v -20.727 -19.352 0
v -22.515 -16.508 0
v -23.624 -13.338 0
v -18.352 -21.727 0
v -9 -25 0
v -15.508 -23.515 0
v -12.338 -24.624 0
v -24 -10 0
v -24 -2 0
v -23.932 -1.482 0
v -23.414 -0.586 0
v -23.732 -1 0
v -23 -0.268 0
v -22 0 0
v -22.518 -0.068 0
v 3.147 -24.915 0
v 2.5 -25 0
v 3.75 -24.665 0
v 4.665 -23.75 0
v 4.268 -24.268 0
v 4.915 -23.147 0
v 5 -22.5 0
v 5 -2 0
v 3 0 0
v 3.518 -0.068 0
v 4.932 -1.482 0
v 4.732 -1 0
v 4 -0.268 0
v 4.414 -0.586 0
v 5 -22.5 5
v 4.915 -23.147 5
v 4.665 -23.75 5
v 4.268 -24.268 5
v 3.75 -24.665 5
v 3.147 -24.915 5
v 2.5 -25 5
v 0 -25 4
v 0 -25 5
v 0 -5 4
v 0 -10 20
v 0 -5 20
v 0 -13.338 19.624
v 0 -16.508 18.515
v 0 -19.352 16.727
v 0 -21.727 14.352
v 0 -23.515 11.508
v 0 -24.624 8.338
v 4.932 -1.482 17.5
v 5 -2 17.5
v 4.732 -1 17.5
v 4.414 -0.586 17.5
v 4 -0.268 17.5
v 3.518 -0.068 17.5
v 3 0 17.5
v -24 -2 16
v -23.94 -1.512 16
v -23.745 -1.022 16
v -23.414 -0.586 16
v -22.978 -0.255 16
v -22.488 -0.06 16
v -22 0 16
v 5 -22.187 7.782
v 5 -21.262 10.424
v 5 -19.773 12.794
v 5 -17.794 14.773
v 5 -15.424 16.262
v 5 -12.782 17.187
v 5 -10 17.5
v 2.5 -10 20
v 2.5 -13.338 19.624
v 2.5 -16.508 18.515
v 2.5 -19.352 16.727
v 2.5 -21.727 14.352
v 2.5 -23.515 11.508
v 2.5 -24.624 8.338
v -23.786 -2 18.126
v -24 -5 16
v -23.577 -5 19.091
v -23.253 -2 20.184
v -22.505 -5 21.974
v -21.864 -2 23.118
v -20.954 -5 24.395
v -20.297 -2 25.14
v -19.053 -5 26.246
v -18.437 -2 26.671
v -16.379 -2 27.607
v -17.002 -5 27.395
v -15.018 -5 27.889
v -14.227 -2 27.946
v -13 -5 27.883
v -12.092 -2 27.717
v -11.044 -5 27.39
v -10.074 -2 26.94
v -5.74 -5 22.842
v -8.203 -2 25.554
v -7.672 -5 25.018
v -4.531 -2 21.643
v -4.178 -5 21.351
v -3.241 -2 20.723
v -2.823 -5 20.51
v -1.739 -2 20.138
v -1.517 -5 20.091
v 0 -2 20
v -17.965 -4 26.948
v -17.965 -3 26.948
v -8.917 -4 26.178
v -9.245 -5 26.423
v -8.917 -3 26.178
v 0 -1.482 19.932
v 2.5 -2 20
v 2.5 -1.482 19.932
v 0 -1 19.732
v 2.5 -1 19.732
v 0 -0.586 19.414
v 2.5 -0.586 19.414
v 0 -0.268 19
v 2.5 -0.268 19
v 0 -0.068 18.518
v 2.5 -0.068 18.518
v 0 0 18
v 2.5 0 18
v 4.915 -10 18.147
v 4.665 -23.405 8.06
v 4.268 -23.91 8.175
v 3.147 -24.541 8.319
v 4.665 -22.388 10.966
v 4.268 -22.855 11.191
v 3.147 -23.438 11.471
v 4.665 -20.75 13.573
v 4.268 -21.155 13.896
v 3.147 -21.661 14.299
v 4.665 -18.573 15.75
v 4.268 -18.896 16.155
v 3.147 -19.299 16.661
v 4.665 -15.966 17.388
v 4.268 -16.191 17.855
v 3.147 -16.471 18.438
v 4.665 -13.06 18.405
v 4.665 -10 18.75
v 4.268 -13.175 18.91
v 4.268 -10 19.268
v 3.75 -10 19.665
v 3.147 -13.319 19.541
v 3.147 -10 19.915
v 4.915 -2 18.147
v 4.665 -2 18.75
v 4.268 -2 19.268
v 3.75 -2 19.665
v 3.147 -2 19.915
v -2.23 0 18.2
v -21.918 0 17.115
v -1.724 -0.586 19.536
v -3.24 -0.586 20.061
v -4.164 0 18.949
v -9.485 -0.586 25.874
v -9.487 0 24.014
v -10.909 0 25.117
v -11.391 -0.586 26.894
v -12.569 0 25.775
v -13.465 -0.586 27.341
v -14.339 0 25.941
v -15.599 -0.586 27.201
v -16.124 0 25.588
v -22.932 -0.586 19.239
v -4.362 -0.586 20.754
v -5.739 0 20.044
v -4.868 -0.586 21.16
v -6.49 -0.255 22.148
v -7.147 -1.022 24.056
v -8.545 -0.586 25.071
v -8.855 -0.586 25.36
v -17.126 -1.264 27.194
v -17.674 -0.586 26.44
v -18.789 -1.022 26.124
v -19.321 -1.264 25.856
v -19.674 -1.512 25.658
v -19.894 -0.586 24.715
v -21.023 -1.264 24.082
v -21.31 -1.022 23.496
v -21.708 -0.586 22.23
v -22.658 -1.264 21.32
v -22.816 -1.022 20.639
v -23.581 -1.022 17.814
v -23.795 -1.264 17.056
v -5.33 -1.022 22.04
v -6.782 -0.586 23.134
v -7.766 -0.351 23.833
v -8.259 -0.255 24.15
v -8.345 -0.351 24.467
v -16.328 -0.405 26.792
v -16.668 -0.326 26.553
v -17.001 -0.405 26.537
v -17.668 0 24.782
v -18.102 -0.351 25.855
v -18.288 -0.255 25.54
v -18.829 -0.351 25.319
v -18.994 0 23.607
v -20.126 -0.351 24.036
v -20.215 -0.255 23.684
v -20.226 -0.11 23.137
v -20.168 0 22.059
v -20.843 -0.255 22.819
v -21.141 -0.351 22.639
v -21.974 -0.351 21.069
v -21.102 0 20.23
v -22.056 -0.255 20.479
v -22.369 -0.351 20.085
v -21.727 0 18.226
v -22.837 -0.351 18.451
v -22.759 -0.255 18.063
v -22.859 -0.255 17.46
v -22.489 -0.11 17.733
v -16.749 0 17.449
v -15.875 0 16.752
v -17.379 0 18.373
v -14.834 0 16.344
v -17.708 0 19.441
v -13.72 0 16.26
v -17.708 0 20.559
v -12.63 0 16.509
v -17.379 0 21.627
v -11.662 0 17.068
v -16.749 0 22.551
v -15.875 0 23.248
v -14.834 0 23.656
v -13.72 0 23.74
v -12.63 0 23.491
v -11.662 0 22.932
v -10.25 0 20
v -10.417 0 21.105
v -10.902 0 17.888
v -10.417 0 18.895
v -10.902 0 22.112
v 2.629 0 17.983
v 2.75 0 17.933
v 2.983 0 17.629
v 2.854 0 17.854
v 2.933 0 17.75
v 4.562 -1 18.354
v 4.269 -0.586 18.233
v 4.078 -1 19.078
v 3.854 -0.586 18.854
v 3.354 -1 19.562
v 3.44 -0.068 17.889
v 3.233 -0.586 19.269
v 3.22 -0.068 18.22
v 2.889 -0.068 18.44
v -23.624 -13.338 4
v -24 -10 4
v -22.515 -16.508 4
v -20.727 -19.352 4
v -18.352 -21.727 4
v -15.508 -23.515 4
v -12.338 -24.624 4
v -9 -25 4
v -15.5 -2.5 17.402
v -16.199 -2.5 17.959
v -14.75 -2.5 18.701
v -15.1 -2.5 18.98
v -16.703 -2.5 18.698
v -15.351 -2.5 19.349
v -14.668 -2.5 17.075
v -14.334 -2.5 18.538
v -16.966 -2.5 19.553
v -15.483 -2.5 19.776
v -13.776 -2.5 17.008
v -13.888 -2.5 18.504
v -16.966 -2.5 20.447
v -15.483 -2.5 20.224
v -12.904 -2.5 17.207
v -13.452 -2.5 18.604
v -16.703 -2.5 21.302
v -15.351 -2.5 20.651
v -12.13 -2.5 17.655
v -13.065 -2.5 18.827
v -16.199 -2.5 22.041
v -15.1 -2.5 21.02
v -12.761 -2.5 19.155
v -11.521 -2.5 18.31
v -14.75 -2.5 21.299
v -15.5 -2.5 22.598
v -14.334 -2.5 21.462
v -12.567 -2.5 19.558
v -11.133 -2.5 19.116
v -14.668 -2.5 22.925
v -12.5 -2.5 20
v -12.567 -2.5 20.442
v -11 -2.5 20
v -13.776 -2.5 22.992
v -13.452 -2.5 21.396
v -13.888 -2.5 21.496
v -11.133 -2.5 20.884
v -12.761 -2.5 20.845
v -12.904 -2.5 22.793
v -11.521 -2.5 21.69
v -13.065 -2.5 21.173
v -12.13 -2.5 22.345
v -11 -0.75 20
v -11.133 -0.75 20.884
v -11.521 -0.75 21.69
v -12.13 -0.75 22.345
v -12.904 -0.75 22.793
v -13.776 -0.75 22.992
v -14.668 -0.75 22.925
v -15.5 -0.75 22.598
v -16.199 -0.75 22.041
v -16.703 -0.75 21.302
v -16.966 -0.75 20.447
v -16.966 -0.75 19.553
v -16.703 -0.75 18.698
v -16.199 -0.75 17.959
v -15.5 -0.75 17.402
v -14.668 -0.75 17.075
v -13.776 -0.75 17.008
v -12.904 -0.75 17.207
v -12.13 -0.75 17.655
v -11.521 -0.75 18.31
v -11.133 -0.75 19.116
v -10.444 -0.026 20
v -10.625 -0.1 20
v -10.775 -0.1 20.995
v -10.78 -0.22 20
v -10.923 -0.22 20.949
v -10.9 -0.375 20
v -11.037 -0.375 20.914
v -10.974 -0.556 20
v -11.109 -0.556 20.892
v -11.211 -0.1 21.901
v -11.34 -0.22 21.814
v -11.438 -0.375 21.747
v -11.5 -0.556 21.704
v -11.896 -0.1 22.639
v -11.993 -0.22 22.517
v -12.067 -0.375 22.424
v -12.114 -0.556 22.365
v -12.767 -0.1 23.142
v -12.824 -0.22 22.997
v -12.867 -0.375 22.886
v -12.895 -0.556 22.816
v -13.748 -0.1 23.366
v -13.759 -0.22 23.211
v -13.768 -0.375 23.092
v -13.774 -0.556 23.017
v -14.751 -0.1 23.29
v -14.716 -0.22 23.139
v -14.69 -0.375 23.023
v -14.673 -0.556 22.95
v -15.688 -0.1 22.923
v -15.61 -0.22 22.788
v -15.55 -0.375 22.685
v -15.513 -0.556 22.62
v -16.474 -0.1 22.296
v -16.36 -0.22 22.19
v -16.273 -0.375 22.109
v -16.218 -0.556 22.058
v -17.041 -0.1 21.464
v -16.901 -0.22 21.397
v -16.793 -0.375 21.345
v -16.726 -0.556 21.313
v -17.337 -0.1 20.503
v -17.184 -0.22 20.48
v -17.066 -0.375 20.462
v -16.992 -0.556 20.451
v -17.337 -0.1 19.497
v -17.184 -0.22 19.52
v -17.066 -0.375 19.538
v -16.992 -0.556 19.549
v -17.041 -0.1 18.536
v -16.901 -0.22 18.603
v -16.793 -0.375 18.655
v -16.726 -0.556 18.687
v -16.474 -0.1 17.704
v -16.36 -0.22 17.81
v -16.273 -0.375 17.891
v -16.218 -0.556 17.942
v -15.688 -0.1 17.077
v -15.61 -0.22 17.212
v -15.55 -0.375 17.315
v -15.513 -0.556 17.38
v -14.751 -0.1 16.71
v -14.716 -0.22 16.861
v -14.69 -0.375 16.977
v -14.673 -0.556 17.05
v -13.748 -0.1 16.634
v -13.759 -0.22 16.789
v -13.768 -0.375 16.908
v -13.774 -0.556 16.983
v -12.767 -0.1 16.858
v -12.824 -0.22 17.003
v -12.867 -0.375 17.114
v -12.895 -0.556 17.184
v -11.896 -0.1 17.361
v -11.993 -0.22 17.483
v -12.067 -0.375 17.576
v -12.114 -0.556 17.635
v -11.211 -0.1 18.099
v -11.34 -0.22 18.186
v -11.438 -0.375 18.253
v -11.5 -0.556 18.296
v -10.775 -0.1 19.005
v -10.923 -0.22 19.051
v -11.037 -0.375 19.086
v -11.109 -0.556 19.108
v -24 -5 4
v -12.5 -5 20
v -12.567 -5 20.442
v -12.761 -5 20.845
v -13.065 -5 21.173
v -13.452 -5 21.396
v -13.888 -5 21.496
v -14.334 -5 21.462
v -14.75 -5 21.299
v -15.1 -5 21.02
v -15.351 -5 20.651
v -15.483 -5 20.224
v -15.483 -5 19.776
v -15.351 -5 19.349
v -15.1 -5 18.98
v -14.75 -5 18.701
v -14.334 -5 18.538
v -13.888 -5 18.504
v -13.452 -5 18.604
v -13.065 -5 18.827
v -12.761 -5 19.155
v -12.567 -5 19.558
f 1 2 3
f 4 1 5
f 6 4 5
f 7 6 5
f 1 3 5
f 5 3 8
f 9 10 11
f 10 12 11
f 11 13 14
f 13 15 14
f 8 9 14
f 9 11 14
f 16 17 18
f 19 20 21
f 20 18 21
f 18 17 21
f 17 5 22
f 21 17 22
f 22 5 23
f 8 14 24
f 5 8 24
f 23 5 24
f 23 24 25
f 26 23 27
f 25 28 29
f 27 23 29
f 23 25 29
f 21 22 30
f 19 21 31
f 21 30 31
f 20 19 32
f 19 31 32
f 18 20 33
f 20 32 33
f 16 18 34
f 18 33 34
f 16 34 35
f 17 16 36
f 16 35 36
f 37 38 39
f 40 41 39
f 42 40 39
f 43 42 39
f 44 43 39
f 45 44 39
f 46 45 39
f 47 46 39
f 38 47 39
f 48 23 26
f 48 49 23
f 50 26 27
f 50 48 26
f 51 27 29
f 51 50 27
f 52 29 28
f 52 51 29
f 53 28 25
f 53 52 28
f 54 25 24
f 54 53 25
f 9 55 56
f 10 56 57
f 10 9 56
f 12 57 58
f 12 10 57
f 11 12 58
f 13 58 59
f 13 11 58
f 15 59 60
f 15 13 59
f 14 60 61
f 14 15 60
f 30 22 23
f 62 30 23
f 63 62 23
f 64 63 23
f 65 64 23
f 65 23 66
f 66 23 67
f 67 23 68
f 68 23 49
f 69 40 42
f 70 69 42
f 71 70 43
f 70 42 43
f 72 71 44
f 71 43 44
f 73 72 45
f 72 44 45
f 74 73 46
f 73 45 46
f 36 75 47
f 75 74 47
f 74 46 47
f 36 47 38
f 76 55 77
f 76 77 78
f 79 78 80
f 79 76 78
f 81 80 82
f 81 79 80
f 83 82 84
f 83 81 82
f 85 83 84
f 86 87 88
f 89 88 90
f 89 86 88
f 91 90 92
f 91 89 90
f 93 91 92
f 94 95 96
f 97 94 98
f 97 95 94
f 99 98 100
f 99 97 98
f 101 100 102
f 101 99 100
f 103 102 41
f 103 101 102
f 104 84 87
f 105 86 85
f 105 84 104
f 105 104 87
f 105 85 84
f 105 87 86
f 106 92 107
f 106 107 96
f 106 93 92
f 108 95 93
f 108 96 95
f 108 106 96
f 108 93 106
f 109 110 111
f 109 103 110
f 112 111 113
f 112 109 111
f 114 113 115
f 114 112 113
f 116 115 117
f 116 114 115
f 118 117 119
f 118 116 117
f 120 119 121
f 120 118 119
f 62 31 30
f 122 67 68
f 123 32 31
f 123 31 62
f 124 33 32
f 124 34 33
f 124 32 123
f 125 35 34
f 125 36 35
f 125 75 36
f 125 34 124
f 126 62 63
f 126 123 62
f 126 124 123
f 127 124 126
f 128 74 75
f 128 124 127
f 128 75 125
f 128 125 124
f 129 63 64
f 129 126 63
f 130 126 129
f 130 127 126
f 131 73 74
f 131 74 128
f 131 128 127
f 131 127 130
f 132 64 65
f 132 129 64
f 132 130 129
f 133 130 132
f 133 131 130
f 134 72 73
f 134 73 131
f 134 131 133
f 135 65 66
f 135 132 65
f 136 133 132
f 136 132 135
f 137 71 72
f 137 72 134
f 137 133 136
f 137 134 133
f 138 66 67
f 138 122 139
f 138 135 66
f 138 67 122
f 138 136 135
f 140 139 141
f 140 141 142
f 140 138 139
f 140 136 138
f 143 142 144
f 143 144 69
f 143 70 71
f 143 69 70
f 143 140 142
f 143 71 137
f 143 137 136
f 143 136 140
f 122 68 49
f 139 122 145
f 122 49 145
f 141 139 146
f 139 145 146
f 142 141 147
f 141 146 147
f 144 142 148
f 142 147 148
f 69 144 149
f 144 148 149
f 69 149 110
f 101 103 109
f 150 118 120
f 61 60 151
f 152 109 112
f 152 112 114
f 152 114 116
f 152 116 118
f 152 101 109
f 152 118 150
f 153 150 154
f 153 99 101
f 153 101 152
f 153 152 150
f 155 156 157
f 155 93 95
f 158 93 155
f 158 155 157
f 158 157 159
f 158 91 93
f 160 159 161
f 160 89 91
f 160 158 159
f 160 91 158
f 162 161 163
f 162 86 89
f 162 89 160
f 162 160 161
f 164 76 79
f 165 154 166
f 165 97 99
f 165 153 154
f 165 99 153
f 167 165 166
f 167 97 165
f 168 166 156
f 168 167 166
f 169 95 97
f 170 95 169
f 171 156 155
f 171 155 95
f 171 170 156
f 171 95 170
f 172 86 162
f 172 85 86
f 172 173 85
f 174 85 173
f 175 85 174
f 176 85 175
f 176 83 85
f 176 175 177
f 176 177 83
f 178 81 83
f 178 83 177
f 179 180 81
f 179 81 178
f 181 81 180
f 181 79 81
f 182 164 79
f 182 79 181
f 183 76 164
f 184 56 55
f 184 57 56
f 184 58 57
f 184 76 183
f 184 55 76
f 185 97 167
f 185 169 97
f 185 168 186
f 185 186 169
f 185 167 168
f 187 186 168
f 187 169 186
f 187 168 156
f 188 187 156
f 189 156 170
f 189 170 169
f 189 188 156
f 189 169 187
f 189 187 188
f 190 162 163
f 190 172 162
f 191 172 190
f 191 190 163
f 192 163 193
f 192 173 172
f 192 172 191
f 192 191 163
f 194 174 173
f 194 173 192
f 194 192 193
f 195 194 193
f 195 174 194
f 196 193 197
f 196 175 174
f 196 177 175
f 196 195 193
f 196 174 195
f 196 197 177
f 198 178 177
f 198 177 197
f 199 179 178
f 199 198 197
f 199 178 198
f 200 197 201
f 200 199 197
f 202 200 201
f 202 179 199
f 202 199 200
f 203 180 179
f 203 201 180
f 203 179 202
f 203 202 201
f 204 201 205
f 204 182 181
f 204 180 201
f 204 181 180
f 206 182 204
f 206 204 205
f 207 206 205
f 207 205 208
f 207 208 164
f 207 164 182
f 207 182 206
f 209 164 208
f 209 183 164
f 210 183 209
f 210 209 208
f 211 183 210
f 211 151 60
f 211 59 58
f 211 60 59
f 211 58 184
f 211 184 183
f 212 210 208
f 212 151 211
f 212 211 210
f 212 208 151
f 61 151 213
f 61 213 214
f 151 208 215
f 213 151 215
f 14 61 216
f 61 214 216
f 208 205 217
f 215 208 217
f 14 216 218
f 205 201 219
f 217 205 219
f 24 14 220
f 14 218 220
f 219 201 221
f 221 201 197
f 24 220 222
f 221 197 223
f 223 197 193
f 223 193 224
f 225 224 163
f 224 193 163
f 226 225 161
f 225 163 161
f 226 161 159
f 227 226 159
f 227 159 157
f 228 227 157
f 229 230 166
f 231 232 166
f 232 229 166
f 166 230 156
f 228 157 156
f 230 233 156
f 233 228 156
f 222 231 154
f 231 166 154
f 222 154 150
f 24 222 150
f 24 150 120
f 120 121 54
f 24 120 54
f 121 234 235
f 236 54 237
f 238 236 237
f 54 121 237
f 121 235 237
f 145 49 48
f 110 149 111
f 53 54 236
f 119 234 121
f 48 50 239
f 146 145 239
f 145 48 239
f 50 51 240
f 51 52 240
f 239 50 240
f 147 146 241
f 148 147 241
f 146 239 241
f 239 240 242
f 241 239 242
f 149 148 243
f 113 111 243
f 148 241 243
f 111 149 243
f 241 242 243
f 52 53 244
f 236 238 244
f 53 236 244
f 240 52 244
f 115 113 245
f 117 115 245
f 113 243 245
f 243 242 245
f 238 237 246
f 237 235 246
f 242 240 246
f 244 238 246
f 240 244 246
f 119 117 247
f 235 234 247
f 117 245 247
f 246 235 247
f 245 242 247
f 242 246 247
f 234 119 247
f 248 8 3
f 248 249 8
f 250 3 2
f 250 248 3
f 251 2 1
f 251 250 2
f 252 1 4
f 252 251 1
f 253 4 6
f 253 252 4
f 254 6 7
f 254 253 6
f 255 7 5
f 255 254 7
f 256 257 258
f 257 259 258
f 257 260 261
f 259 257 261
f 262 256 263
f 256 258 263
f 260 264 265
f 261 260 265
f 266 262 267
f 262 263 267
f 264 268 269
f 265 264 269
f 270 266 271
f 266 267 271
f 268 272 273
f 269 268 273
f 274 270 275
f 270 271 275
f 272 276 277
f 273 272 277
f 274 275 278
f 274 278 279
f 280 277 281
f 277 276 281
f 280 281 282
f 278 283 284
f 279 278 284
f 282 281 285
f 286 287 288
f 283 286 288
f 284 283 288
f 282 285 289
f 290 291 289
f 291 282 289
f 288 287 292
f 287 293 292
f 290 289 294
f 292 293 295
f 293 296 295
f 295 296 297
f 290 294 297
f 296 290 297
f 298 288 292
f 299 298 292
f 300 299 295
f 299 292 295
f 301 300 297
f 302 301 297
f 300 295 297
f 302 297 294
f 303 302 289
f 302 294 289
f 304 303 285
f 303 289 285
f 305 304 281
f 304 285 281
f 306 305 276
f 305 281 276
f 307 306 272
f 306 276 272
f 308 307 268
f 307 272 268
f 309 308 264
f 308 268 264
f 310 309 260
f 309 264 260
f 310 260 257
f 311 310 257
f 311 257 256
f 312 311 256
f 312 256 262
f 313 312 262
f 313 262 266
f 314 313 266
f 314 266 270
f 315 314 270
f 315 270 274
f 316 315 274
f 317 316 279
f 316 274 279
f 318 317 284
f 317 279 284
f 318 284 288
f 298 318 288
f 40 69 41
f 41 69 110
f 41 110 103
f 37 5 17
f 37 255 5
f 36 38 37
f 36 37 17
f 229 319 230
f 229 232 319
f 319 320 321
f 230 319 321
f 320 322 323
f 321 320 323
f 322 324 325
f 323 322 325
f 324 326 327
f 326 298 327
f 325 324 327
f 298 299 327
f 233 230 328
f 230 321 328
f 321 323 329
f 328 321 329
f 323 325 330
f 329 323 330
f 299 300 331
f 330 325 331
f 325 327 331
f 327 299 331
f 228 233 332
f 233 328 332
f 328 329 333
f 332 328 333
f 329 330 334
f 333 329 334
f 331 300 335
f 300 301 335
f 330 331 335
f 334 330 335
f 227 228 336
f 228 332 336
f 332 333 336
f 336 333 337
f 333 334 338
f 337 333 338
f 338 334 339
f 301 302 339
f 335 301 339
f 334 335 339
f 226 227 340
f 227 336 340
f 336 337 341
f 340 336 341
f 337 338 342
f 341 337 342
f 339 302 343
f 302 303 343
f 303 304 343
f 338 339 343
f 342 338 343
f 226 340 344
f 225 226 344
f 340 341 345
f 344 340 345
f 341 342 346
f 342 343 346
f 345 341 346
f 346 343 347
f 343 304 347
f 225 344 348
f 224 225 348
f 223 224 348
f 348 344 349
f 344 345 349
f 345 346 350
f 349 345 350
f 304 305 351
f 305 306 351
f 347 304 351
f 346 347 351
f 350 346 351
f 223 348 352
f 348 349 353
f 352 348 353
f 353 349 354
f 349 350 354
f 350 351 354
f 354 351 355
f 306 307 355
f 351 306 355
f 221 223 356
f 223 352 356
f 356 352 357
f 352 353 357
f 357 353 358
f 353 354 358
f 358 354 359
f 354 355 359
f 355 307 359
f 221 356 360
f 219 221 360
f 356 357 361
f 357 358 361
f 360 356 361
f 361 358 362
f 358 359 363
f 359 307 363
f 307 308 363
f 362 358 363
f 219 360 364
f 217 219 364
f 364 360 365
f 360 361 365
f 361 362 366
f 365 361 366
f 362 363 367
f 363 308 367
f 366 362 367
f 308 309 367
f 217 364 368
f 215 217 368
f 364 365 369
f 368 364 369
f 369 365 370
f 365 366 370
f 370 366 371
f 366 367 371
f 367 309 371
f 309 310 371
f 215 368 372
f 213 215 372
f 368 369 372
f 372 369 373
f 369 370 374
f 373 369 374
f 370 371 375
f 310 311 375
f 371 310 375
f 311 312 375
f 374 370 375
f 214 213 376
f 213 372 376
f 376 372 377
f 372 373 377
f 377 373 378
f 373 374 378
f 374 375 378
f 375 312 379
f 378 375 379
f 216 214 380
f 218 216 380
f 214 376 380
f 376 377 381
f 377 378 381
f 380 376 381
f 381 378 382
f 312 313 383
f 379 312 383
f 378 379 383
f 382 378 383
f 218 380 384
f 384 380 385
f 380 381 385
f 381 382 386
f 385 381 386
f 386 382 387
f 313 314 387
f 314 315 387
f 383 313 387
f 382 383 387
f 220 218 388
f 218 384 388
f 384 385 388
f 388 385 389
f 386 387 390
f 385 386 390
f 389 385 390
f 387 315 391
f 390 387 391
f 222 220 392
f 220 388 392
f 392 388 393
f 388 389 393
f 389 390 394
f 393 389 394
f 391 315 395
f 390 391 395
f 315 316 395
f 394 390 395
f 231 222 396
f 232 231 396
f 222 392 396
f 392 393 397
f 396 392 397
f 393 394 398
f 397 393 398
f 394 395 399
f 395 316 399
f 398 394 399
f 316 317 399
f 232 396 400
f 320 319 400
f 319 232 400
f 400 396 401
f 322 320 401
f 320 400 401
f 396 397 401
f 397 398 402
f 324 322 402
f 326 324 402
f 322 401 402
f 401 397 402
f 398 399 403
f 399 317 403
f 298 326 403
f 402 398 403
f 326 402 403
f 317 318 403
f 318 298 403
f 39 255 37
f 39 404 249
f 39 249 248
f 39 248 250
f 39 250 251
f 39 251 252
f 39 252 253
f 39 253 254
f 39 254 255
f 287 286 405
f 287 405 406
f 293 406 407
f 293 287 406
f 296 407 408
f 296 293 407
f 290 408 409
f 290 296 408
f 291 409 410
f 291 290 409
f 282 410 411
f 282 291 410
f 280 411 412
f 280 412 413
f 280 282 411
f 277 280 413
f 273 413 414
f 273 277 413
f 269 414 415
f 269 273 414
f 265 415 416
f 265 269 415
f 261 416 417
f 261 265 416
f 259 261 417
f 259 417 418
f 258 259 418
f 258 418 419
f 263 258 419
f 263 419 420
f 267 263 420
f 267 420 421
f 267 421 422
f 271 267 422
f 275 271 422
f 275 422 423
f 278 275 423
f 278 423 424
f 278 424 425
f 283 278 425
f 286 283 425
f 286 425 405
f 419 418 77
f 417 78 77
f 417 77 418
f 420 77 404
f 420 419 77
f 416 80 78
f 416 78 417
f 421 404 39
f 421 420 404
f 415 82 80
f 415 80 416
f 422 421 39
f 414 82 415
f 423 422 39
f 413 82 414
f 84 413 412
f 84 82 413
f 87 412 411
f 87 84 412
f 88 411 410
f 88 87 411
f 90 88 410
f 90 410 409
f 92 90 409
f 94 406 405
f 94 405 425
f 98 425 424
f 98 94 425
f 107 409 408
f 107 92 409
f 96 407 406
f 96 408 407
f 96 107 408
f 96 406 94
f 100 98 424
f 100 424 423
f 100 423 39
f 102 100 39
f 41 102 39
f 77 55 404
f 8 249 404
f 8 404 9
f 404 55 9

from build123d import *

# Parameters (mm, degrees)
F0_W     = 24
F0_H     = 4
F1_DEPTH = 25
F0_R     = 3
F0_R_2   = 1.5
F2_DEPTH = 5
F3_R     = 15
F4_R     = 2.5
F5_DEPTH = 2.5
F6_R     = 2
F7_R     = 0.75


with BuildPart() as f1:
    # F0 (on Front) → F1 (new body)
    with BuildSketch(Plane.XZ):
        with Locations((-12, 2)):
            Rectangle(F0_W, F0_H)
        Polygon((0, 20), (0, 4), (0, 0), (5, 0), (5, 20), align=None)
    extrude(amount=F1_DEPTH)

    # F0 (on Front) → F2 (join)
    with BuildSketch(Plane.XZ):
        with BuildLine():
            Line((-24, 16), (-24, 4))
            Line((-24, 4), (0, 4))
            Line((0, 4), (0, 20))
            add(Edge.make_bspline(
                [(-24, 16), (-23.9093121332, 20.5852864547), (-19.2329736628, 28.9244579006), (-7.5913408906, 27.8374196293), (-4.487070255, 19.7345465422), (0, 20)],
                knots=[0, 0, 0, 0, 0.3592153928, 0.6653798243, 1, 1, 1, 1], degree=3))
        make_face()
        with Locations((-14, 20)):
            Circle(F0_R, mode=Mode.SUBTRACT)
        with Locations((-12, 2)):
            Rectangle(F0_W, F0_H)
        Polygon((0, 20), (0, 4), (0, 0), (5, 0), (5, 20), align=None)
        with Locations((-14, 20)):
            Circle(F0_R)
        with Locations((-14, 20)):
            Circle(F0_R_2, mode=Mode.SUBTRACT)
    extrude(amount=F2_DEPTH)

    # F3
    f3_edges = [f1.edges().sort_by_distance(p)[0] for p in [
        (-24, -25, 2),
        (2.5, -25, 20),
    ]]
    fillet(f3_edges, radius=F3_R)

    # F4
    f4_edges = [f1.edges().sort_by_distance(p)[0] for p in [
        (5, -5, 20),
    ]]
    fillet(f4_edges, radius=F4_R)

    # F0 (on Front) → F5 (cut, symmetric)
    with BuildSketch(Plane.XZ):
        with Locations((-14, 20)):
            Circle(F0_R)
        with Locations((-14, 20)):
            Circle(F0_R_2, mode=Mode.SUBTRACT)
    extrude(amount=F5_DEPTH, both=True, mode=Mode.SUBTRACT)

    # F6
    f6_edges = [f1.edges().sort_by_distance(p)[0] for p in [
        (5, 0, 8.75),
        (4.267767, 0, 19.267767),
        (-24, 0, 8),
        (-14.21195, 0, 27.945974),
        (1.25, 0, 20),
    ]]
    fillet(f6_edges, radius=F6_R)

    # F7
    f7_edges = [f1.edges().sort_by_distance(p)[0] for p in [
        (-17, 0, 20),
    ]]
    fillet(f7_edges, radius=F7_R)


solid = f1.part
